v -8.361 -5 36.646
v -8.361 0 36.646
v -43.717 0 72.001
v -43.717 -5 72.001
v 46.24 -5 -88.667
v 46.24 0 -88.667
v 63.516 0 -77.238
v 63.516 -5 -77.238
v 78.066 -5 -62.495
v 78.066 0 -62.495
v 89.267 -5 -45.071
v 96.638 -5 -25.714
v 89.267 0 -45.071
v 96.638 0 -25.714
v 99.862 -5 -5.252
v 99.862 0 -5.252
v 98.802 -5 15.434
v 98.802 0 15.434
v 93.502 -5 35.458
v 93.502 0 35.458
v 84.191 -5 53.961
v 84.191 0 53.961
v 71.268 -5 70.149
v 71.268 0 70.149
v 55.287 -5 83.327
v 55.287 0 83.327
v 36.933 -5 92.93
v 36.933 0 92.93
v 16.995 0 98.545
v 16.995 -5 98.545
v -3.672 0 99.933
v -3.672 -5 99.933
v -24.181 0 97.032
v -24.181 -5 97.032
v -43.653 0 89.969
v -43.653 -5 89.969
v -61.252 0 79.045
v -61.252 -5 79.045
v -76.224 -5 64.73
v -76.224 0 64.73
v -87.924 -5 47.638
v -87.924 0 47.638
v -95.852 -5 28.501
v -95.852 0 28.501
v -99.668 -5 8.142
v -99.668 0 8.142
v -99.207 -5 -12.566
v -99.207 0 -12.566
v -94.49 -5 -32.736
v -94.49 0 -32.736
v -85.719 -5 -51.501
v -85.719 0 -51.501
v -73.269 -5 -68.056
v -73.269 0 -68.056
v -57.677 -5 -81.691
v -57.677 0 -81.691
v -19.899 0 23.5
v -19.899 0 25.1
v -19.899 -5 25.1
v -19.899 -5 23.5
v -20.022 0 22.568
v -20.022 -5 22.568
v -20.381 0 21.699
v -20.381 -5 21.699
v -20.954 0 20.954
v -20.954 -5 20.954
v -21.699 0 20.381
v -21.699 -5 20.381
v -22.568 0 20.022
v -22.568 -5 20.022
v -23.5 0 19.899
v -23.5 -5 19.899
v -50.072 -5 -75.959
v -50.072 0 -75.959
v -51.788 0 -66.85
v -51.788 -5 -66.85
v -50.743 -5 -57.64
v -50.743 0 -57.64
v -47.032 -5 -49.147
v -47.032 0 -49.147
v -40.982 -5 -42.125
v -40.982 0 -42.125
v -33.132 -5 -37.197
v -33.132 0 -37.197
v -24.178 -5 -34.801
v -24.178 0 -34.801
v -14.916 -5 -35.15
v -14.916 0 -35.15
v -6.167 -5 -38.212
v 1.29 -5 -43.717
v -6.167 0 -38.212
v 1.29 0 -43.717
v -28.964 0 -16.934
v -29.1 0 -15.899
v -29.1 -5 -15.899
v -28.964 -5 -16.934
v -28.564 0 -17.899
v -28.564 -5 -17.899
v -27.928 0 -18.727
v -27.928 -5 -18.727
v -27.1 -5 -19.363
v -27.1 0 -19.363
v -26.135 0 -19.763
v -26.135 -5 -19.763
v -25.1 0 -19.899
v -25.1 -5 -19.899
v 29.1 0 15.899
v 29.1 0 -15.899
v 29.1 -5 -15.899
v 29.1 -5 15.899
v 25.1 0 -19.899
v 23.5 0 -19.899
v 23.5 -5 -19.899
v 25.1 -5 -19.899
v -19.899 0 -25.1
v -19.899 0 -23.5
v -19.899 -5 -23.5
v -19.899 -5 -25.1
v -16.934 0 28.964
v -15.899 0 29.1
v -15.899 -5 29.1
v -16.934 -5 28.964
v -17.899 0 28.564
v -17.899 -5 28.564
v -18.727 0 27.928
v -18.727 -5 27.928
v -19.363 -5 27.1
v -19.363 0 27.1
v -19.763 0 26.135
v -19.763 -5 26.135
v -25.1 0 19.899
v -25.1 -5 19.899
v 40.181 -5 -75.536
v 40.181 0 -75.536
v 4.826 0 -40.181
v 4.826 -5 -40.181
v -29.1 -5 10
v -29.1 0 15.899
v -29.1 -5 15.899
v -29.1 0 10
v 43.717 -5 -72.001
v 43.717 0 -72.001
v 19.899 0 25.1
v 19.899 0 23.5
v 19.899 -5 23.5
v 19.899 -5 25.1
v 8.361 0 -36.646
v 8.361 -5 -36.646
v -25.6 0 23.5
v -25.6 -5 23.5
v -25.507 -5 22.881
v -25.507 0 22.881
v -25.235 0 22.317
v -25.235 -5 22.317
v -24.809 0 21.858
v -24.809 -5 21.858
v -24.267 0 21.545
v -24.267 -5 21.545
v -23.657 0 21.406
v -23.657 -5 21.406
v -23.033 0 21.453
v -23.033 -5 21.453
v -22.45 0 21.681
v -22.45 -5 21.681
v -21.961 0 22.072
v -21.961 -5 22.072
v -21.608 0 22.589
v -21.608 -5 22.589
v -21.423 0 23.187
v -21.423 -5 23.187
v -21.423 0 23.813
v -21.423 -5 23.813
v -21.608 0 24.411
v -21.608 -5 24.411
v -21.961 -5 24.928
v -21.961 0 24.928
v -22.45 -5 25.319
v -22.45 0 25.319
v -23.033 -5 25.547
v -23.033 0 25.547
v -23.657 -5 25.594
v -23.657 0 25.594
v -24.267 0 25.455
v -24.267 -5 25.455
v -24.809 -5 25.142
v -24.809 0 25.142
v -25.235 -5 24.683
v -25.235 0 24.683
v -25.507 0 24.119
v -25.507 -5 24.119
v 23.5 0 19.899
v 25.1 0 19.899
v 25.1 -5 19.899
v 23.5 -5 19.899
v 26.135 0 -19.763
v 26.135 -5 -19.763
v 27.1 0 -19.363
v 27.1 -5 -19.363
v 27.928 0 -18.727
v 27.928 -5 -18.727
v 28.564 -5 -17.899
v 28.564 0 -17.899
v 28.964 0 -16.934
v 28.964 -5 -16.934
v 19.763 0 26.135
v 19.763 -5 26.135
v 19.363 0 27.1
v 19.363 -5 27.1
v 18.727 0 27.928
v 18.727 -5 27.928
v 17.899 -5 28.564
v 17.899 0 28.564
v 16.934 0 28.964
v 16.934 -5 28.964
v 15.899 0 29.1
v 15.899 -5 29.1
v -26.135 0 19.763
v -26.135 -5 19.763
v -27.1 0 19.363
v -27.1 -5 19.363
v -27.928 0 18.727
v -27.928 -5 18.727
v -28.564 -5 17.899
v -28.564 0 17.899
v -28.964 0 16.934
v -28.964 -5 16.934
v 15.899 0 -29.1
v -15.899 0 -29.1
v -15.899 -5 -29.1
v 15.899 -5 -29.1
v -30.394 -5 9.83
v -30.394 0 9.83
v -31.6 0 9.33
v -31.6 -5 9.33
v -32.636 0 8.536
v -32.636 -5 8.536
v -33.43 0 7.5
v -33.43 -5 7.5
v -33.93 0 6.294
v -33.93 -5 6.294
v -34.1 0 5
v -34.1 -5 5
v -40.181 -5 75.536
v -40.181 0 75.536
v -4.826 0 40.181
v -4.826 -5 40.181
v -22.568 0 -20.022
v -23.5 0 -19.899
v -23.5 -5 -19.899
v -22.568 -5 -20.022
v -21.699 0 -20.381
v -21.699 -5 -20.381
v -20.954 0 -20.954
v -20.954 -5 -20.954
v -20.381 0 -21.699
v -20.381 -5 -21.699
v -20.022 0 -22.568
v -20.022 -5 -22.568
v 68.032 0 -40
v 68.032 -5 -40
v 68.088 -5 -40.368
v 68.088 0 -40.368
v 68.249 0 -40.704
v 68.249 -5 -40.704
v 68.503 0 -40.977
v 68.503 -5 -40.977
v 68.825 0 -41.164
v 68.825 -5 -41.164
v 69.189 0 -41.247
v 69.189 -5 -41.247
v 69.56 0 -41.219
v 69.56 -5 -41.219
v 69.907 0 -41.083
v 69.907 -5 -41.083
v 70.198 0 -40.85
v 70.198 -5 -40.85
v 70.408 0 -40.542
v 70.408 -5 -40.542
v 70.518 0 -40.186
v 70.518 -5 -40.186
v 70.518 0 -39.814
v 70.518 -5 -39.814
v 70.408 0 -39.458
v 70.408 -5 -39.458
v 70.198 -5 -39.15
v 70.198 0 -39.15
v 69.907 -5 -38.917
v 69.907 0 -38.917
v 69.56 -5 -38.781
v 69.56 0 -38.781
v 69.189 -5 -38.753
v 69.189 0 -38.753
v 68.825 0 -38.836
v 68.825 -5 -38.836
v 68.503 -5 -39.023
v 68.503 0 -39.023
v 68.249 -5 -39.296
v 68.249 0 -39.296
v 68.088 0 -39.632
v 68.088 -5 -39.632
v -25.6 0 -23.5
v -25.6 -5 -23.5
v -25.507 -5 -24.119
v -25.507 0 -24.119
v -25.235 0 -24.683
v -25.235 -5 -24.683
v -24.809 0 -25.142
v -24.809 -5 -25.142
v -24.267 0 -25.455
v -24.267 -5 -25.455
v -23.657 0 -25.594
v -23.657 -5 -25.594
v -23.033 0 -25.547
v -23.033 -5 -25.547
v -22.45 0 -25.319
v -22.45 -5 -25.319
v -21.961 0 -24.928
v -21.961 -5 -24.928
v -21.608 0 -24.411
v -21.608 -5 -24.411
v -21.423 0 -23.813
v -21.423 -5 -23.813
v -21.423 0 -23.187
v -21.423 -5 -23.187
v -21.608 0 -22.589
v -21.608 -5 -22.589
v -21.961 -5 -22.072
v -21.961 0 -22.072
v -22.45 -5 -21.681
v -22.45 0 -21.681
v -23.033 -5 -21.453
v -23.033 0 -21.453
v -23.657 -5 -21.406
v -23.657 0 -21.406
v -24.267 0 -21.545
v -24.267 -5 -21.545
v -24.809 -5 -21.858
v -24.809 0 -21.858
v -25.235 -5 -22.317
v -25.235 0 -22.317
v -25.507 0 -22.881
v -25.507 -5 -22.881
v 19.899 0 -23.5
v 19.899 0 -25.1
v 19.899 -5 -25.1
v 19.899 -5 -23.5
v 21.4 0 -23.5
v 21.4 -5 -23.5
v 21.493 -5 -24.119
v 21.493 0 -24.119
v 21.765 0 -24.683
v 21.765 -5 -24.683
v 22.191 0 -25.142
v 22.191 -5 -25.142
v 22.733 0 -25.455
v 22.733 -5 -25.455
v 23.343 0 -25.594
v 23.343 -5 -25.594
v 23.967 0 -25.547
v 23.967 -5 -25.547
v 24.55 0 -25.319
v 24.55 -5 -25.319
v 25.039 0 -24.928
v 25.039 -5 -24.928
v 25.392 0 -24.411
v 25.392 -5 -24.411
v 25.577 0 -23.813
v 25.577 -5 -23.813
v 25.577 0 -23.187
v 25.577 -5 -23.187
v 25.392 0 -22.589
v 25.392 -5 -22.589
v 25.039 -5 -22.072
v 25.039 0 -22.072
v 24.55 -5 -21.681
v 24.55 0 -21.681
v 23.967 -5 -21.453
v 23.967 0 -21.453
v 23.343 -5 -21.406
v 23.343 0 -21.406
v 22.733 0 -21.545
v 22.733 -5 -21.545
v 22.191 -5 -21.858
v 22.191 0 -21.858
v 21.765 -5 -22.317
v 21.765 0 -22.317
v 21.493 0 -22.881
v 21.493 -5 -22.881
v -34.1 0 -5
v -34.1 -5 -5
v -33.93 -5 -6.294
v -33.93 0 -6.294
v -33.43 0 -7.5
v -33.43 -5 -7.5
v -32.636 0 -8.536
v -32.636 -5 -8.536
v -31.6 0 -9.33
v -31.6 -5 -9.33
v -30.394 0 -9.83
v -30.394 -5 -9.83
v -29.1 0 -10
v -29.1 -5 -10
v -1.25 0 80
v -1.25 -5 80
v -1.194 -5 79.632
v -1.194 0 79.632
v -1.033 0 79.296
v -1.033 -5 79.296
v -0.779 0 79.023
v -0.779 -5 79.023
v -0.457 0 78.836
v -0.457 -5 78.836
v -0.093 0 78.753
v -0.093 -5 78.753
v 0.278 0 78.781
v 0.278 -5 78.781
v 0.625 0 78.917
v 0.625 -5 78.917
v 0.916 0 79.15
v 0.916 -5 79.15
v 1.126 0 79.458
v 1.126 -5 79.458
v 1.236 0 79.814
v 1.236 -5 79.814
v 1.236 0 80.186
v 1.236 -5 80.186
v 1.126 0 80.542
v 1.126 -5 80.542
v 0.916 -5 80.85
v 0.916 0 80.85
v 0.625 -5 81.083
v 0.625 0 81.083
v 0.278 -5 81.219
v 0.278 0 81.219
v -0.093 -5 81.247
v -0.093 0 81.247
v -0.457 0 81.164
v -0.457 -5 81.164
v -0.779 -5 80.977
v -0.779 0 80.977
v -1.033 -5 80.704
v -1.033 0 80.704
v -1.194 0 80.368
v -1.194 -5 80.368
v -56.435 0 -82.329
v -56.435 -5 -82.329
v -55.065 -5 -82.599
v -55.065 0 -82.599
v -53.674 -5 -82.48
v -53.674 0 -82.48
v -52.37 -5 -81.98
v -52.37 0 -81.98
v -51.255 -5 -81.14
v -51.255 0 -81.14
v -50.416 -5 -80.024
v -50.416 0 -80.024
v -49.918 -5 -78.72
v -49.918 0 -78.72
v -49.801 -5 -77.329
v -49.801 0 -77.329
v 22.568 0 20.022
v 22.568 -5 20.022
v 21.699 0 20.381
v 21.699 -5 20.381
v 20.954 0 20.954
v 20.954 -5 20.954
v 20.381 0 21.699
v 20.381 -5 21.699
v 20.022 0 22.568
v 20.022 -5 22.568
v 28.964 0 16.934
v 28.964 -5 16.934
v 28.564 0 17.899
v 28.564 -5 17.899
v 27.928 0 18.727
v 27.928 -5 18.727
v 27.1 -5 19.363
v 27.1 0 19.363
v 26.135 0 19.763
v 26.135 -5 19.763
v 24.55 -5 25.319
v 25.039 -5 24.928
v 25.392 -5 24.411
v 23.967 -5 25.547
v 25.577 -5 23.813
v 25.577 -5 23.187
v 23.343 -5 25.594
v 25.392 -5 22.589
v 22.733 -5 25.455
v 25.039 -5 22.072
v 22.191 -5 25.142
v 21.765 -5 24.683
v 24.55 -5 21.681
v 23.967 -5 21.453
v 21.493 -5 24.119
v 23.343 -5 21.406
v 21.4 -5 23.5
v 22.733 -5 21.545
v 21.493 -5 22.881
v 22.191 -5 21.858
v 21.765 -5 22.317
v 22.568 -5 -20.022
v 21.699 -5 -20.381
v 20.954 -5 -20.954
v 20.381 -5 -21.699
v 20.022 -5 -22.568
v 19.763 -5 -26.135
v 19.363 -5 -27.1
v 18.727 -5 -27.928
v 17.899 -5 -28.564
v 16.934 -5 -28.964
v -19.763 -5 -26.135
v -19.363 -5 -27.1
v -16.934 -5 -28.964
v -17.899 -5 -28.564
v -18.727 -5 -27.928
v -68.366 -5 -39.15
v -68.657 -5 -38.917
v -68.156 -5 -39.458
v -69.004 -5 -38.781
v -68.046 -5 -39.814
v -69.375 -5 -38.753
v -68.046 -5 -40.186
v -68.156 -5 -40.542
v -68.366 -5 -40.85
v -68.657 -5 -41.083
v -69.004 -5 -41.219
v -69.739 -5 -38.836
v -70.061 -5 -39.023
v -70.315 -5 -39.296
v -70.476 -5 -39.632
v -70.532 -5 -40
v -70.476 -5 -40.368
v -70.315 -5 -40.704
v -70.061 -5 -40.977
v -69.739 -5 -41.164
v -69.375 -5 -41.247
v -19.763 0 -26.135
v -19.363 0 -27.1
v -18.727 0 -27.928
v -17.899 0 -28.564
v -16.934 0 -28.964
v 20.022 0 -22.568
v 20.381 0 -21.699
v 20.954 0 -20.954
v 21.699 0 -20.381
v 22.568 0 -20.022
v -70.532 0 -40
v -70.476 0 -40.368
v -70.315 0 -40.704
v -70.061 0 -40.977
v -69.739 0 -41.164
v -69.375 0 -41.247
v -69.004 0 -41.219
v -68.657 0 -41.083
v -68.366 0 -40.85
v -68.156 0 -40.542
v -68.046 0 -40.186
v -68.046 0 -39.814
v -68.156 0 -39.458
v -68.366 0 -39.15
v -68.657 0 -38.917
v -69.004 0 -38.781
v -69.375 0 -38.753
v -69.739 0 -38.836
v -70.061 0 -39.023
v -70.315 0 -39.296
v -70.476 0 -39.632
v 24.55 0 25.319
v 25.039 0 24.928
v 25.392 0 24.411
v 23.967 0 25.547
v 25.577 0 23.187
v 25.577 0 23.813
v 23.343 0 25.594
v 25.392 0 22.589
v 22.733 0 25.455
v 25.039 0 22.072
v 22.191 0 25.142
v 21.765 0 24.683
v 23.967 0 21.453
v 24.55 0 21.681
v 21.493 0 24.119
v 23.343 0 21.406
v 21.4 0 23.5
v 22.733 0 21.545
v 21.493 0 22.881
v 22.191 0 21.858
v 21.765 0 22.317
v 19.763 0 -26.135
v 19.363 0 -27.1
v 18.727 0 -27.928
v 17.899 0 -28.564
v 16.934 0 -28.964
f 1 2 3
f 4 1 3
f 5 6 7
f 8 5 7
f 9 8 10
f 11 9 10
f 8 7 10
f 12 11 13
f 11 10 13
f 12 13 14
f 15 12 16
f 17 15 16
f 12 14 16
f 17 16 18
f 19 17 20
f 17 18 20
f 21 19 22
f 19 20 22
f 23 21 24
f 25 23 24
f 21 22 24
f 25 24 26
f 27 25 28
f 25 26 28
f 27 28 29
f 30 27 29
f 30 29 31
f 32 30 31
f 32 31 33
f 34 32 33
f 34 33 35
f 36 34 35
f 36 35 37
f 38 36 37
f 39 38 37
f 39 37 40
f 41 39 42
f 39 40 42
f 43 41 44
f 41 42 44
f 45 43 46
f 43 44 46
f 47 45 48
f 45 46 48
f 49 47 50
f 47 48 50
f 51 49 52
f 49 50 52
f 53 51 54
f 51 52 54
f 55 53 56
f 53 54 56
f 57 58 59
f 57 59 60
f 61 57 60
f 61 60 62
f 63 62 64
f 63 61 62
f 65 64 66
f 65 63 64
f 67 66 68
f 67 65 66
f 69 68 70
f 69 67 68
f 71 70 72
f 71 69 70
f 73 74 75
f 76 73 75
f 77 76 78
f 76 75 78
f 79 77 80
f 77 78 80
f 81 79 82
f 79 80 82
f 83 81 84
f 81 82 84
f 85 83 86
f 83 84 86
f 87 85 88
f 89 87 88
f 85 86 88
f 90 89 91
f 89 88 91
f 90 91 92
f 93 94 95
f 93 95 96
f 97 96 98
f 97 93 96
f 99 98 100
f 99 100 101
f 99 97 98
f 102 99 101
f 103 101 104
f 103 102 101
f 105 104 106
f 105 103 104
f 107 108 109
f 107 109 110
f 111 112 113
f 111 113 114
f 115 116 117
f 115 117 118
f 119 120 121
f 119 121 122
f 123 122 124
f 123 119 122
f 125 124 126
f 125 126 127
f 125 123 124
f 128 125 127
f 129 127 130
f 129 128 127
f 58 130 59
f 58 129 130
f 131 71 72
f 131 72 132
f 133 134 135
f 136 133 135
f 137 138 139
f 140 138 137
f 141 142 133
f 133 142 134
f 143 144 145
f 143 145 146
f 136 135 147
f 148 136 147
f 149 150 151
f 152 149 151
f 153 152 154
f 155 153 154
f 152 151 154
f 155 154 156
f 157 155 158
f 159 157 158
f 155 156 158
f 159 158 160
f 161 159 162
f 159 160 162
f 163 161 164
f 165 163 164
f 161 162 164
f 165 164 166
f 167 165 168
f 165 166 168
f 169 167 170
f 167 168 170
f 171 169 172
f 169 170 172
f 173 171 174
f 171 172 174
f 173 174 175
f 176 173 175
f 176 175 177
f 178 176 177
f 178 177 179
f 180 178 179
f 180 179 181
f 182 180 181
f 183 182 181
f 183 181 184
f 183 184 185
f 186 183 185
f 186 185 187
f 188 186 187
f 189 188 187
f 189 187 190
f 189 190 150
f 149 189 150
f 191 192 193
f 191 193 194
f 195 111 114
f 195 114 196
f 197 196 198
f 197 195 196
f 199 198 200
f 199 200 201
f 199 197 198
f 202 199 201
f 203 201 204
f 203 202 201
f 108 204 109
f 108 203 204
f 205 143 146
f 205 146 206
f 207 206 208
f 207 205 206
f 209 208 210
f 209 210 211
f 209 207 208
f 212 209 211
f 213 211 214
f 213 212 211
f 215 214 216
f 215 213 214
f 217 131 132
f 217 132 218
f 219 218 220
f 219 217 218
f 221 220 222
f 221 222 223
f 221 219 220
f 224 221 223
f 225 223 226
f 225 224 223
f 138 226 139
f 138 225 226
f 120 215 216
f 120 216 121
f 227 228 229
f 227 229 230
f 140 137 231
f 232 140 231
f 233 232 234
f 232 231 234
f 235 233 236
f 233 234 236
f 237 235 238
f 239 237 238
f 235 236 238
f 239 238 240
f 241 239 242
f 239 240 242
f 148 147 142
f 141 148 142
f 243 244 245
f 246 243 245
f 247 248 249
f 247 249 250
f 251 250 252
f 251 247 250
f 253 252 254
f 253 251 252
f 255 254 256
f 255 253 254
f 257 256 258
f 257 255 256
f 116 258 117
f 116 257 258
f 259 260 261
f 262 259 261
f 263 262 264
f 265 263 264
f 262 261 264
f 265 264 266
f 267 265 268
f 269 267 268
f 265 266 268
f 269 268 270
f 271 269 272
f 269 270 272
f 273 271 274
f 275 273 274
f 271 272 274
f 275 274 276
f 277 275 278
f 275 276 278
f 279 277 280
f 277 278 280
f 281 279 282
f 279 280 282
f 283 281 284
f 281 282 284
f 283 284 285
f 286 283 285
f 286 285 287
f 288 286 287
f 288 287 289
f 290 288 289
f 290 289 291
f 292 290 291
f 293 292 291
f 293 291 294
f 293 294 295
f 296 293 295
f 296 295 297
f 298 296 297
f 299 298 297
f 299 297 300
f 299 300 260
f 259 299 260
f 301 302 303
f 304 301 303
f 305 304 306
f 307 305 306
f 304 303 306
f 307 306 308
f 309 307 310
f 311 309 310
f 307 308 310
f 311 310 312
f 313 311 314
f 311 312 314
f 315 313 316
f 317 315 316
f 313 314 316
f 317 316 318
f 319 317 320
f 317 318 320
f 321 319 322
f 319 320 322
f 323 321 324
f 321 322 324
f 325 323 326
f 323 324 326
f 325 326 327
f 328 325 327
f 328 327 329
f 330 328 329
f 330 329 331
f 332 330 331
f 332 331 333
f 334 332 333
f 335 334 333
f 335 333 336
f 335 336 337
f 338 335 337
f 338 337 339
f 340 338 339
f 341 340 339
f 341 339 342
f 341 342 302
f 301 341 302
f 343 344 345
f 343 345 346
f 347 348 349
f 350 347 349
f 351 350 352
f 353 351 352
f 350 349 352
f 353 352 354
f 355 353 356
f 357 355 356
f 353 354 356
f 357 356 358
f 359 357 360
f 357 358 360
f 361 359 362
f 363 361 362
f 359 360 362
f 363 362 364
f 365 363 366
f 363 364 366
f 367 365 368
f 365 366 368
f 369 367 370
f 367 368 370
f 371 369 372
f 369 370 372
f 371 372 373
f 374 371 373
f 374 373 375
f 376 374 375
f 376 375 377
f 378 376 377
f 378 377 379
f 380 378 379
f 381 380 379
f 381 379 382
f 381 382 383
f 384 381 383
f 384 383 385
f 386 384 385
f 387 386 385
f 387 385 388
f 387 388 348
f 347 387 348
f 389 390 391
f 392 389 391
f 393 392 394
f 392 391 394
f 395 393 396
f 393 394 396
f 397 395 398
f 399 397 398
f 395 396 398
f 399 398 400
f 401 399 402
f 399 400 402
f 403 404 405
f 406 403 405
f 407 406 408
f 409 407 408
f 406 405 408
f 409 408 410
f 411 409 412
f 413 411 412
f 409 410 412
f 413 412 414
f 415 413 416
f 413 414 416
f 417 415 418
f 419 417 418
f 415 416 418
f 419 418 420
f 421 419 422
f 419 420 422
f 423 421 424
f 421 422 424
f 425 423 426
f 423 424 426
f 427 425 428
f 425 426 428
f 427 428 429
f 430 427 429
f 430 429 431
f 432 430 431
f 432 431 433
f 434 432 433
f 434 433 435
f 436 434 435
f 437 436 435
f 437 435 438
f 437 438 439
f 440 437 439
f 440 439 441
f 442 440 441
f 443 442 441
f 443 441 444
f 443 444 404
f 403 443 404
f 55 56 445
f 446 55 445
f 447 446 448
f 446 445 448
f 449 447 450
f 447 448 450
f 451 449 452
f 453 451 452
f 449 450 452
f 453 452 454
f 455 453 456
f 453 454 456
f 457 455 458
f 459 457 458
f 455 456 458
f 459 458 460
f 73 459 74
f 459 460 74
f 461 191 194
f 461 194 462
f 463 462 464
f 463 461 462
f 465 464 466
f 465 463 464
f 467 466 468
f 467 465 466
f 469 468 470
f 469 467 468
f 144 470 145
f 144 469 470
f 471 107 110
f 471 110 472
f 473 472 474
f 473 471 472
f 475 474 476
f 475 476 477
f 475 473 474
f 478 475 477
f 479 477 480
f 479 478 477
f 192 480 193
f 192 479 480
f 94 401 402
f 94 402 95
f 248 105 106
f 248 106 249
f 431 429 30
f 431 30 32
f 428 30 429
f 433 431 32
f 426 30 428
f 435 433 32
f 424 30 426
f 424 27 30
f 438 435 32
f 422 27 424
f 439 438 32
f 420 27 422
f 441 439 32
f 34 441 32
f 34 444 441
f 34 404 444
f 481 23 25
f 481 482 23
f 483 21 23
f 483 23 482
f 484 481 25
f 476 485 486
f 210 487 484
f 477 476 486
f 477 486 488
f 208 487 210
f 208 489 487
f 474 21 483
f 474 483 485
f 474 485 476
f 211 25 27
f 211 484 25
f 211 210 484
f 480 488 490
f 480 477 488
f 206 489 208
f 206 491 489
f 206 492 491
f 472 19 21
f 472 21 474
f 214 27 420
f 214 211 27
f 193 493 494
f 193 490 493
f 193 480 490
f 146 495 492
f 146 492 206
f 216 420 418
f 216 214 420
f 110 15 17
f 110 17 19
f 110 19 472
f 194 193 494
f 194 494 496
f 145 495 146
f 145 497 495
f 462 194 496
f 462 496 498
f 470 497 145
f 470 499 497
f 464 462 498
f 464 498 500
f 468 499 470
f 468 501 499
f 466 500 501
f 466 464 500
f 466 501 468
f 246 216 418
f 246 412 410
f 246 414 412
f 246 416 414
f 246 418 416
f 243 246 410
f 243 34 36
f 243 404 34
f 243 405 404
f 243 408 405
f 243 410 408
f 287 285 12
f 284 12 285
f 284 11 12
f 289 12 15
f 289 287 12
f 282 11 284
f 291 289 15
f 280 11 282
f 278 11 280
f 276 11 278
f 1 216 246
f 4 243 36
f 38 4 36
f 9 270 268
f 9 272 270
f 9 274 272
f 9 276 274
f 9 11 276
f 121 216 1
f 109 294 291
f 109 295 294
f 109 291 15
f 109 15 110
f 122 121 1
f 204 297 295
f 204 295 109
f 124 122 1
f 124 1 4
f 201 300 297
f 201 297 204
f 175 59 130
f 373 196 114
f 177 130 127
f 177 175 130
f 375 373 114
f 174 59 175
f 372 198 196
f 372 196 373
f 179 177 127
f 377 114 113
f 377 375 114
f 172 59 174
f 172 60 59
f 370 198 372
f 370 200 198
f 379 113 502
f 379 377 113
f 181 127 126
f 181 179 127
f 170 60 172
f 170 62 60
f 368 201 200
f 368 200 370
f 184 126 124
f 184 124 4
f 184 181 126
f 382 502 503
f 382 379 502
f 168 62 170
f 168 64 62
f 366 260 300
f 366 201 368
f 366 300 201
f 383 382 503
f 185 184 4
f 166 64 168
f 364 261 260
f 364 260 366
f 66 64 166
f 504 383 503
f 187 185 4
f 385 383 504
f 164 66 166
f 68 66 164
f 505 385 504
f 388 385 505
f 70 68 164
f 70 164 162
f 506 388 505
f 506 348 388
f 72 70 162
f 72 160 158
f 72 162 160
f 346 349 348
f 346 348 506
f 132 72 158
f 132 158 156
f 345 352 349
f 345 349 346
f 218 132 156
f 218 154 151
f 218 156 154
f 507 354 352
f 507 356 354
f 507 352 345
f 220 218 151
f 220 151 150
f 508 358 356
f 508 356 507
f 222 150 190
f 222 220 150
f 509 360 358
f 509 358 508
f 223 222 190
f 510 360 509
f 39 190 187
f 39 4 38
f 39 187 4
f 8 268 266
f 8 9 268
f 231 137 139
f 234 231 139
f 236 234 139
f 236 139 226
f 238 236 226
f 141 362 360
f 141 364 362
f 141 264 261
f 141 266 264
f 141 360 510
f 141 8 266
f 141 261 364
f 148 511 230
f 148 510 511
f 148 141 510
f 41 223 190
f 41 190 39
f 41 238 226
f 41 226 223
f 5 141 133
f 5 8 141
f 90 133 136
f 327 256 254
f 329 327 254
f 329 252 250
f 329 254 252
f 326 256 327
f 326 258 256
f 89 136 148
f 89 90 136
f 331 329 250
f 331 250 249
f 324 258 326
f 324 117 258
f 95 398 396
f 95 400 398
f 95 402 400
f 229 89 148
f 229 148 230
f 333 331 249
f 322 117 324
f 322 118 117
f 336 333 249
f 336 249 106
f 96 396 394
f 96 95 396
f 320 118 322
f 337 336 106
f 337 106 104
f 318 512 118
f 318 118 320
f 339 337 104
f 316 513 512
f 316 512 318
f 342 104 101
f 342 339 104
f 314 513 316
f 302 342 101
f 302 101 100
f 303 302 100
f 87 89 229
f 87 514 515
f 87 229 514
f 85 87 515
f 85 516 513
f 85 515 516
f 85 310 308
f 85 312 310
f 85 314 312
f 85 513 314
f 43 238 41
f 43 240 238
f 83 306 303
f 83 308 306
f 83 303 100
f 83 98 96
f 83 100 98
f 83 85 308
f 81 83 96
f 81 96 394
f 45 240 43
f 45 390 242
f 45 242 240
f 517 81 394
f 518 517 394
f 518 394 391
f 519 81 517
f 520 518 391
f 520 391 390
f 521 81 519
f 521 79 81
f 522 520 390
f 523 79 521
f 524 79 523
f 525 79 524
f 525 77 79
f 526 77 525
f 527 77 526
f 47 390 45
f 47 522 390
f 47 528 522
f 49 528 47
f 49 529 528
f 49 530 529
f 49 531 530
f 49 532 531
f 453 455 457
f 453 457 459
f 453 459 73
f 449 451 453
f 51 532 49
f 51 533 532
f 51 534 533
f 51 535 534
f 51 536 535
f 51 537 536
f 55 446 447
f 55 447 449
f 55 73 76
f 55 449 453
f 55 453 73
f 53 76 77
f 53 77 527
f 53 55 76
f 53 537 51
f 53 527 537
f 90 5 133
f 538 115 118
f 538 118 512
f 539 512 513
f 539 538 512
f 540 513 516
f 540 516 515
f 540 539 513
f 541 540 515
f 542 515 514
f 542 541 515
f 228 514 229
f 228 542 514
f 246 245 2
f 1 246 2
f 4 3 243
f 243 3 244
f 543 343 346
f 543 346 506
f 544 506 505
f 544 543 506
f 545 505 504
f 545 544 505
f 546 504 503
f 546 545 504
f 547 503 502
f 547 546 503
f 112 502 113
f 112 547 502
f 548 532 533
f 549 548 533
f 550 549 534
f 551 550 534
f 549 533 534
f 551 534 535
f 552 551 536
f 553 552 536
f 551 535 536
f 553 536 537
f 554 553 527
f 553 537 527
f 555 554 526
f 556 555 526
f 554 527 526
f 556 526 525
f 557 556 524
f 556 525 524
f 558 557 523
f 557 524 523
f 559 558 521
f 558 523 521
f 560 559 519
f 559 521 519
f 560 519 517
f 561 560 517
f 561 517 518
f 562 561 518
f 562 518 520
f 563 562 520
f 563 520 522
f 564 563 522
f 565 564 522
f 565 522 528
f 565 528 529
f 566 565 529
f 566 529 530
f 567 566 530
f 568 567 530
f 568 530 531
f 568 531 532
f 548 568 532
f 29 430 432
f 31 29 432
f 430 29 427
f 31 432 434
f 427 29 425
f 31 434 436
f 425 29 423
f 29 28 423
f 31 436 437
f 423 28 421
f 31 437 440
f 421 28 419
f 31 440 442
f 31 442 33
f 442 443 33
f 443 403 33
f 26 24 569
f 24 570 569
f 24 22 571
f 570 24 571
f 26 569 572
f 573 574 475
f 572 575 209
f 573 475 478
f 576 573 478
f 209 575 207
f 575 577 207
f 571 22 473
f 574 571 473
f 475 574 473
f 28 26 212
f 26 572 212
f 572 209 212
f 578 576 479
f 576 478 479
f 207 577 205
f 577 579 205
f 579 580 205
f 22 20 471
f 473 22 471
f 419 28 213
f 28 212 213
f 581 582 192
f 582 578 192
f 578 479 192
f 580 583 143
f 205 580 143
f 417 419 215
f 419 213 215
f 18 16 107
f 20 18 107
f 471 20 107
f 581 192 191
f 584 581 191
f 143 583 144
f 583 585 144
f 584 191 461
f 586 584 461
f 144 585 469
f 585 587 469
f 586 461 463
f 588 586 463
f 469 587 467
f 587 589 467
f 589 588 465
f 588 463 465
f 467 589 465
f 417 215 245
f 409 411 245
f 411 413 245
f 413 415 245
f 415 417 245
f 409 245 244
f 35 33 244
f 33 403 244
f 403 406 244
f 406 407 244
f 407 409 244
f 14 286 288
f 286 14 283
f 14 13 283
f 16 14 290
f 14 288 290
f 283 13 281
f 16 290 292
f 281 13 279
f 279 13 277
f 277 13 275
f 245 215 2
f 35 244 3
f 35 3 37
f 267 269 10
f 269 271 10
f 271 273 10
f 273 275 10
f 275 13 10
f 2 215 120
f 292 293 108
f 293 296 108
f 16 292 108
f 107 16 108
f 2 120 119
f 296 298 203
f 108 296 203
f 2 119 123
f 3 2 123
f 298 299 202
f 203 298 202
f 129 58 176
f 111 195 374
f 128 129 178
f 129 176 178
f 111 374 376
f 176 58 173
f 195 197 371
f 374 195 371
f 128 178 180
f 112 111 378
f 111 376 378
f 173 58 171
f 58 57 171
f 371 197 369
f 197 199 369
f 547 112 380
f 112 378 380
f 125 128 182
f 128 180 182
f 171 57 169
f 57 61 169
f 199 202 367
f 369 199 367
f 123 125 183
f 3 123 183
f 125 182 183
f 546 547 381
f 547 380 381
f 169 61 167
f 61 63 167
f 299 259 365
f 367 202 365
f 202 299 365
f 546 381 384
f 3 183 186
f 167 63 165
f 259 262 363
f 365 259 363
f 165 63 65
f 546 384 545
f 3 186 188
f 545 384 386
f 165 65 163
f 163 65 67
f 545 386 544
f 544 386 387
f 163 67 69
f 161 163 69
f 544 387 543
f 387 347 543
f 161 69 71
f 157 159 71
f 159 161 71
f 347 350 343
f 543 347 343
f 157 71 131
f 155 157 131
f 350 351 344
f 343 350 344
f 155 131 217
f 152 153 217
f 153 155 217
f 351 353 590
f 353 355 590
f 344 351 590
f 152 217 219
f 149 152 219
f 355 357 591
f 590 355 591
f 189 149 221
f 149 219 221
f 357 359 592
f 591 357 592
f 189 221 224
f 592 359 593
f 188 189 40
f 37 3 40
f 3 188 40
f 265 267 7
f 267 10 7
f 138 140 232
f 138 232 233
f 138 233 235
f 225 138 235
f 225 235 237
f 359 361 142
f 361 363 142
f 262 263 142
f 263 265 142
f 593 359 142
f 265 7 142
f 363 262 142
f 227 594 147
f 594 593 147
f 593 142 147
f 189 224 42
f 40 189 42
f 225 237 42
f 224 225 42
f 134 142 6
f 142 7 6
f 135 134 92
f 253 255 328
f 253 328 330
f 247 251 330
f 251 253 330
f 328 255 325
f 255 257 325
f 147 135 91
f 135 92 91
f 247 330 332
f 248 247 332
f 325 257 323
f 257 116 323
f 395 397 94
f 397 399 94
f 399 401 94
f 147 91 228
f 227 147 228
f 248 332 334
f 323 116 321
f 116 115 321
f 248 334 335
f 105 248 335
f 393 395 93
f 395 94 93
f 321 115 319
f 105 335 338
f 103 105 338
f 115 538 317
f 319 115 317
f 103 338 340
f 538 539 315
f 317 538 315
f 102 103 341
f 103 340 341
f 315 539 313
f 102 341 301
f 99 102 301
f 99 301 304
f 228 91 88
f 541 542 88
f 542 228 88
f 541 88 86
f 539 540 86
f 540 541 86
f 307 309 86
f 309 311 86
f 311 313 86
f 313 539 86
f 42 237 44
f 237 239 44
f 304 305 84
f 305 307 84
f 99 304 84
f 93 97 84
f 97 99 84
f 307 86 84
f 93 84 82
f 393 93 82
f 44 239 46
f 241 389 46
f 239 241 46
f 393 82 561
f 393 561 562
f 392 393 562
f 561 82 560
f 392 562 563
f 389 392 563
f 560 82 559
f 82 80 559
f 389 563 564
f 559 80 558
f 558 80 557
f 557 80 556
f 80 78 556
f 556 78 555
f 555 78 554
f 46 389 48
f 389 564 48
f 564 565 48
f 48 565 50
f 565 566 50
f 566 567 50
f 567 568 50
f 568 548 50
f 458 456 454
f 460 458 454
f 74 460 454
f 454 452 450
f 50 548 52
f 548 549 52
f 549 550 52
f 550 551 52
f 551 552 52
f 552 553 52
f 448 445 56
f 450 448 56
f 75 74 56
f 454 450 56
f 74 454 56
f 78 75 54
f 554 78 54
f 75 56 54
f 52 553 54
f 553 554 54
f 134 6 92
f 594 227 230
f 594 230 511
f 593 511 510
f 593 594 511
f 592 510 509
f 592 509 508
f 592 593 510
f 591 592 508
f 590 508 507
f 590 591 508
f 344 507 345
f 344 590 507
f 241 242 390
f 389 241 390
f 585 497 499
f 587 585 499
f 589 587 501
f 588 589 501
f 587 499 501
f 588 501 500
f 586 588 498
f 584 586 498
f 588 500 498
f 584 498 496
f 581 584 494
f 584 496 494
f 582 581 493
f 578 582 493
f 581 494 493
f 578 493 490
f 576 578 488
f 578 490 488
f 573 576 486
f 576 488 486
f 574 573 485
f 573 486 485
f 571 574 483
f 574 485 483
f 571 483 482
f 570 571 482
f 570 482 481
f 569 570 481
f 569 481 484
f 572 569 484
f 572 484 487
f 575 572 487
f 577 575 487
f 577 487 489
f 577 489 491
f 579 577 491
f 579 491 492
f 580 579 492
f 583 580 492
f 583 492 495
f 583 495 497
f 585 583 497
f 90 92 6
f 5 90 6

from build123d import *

# Parameters (mm, degrees)
EXTRUDE_1_DEPTH          = 5
CUT_EXTRUDE_1_DEPTH      = 142.509716981
CUT_EXTRUDE_1_DEPTH_BACK = 142.509716981
HOLE_WIZARD_M5_1_D       = 4.2
HOLE_WIZARD_M3_1_D       = 2.5


with BuildPart() as part:
    # 草圖1 → 填料-伸長1 (new body)
    with BuildSketch(Plane(origin=(0, 0, 0), x_dir=(1, 0, 0), z_dir=(0, 1, 0))):
        with BuildLine():
            Line((46.240484381, 88.666891252), (1.290175475, 43.716582347))
            ThreePointArc((1.290175475, 43.716582347), (-37.241511516, 39.366784953), (-50.07196053, 75.95901388))
            ThreePointArc((-50.07196053, 75.95901388), (-51.783240076, 81.599208584), (-57.67661441, 81.690930648))
            ThreePointArc((-57.67661441, 81.690930648), (6.697930583, -99.775436486), (46.240484381, 88.666891252))
        make_face()
        Polygon((-40.181048441, -75.5363875), (-43.716582347, -72.000853594), (-8.361243287, -36.645514535), (-4.825709381, -40.181048441), align=None, mode=Mode.SUBTRACT)
        with BuildLine():
            ThreePointArc((-23.499999452, 19.89891353), (-20.953647337, 20.953647337), (-19.89891353, 23.499999452))
            Line((-19.89891353, 23.499999452), (-19.898913286, 25.100000259))
            ThreePointArc((-19.898913286, 25.100000259), (-18.727340196, 27.92842699), (-15.898913286, 29.09999965))
            Line((-15.898913286, 29.09999965), (15.898913286, 29.09999965))
            ThreePointArc((15.898913286, 29.09999965), (18.727340196, 27.92842699), (19.898913286, 25.100000259))
            Line((19.898913286, 25.100000259), (19.89891353, 23.499999452))
            ThreePointArc((19.89891353, 23.499999452), (20.953647337, 20.953647337), (23.499999452, 19.89891353))
            Line((23.499999452, 19.89891353), (25.100000259, 19.898913286))
            ThreePointArc((25.100000259, 19.898913286), (27.92842699, 18.727340196), (29.09999965, 15.898913286))
            Line((29.09999965, 15.898913286), (29.09999965, -15.898913286))
            ThreePointArc((29.09999965, -15.898913286), (27.92842699, -18.727340196), (25.100000259, -19.898913286))
            Line((25.100000259, -19.898913286), (23.499999452, -19.89891353))
            ThreePointArc((23.499999452, -19.89891353), (20.953647337, -20.953647337), (19.89891353, -23.499999452))
            Line((19.89891353, -23.499999452), (19.898913286, -25.100000259))
            ThreePointArc((19.898913286, -25.100000259), (18.727340196, -27.92842699), (15.898913286, -29.09999965))
            Line((15.898913286, -29.09999965), (-15.898913286, -29.09999965))
            ThreePointArc((-15.898913286, -29.09999965), (-18.727340196, -27.92842699), (-19.898913286, -25.100000259))
            Line((-19.898913286, -25.100000259), (-19.89891353, -23.499999452))
            ThreePointArc((-19.89891353, -23.499999452), (-20.953647337, -20.953647337), (-23.499999452, -19.89891353))
            Line((-23.499999452, -19.89891353), (-25.100000259, -19.898913286))
            ThreePointArc((-25.100000259, -19.898913286), (-27.92842699, -18.727340196), (-29.09999965, -15.898913286))
            Line((-29.09999965, -15.898913286), (-29.09999965, 15.898913286))
            ThreePointArc((-29.09999965, 15.898913286), (-27.92842699, 18.727340196), (-25.100000259, 19.898913286))
            Line((-25.100000259, 19.898913286), (-23.499999452, 19.89891353))
        make_face(mode=Mode.SUBTRACT)
        Polygon((43.716582347, 72.000853594), (8.361243287, 36.645514535), (4.825709381, 40.181048441), (40.181048441, 75.5363875), align=None, mode=Mode.SUBTRACT)
    extrude(amount=-EXTRUDE_1_DEPTH)

    # 草圖5 → 除料-伸長1 (cut, two sides: drawn at the far end of the back side and taken through both)
    with BuildSketch(Plane(origin=(0, 0, 0), x_dir=(1, 0, 0), z_dir=(0, 1, 0)).offset(-CUT_EXTRUDE_1_DEPTH_BACK)):
        with BuildLine():
            Line((-34.09999965, -5), (-34.09999965, 5))
            ThreePointArc((-34.09999965, 5), (-29.09999965, 10), (-24.09999965, 5))
            Line((-24.09999965, 5), (-24.09999965, -5))
            ThreePointArc((-24.09999965, -5), (-29.09999965, -10), (-34.09999965, -5))
        make_face()
    extrude(amount=CUT_EXTRUDE_1_DEPTH + CUT_EXTRUDE_1_DEPTH_BACK, mode=Mode.SUBTRACT)

    # M5  螺絲攻的螺孔鑽1 (through all)
    with Locations(Plane(origin=(0, 0, 0), x_dir=(1, 0, 0), z_dir=(0, 1, 0))):
        with Locations((23.5, 23.5), (23.5, -23.5), (-23.5, -23.5), (-23.5, 23.5)):
            Hole(HOLE_WIZARD_M5_1_D / 2)

    # M3  螺絲攻的螺孔鑽1 (through all)
    with Locations(Plane(origin=(0, 0, 0), x_dir=(1, 0, 0), z_dir=(0, 1, 0))):
        with Locations((-69.282032303, 40), (0, -80), (69.282032303, 40)):
            Hole(HOLE_WIZARD_M3_1_D / 2)


solid = part.part
